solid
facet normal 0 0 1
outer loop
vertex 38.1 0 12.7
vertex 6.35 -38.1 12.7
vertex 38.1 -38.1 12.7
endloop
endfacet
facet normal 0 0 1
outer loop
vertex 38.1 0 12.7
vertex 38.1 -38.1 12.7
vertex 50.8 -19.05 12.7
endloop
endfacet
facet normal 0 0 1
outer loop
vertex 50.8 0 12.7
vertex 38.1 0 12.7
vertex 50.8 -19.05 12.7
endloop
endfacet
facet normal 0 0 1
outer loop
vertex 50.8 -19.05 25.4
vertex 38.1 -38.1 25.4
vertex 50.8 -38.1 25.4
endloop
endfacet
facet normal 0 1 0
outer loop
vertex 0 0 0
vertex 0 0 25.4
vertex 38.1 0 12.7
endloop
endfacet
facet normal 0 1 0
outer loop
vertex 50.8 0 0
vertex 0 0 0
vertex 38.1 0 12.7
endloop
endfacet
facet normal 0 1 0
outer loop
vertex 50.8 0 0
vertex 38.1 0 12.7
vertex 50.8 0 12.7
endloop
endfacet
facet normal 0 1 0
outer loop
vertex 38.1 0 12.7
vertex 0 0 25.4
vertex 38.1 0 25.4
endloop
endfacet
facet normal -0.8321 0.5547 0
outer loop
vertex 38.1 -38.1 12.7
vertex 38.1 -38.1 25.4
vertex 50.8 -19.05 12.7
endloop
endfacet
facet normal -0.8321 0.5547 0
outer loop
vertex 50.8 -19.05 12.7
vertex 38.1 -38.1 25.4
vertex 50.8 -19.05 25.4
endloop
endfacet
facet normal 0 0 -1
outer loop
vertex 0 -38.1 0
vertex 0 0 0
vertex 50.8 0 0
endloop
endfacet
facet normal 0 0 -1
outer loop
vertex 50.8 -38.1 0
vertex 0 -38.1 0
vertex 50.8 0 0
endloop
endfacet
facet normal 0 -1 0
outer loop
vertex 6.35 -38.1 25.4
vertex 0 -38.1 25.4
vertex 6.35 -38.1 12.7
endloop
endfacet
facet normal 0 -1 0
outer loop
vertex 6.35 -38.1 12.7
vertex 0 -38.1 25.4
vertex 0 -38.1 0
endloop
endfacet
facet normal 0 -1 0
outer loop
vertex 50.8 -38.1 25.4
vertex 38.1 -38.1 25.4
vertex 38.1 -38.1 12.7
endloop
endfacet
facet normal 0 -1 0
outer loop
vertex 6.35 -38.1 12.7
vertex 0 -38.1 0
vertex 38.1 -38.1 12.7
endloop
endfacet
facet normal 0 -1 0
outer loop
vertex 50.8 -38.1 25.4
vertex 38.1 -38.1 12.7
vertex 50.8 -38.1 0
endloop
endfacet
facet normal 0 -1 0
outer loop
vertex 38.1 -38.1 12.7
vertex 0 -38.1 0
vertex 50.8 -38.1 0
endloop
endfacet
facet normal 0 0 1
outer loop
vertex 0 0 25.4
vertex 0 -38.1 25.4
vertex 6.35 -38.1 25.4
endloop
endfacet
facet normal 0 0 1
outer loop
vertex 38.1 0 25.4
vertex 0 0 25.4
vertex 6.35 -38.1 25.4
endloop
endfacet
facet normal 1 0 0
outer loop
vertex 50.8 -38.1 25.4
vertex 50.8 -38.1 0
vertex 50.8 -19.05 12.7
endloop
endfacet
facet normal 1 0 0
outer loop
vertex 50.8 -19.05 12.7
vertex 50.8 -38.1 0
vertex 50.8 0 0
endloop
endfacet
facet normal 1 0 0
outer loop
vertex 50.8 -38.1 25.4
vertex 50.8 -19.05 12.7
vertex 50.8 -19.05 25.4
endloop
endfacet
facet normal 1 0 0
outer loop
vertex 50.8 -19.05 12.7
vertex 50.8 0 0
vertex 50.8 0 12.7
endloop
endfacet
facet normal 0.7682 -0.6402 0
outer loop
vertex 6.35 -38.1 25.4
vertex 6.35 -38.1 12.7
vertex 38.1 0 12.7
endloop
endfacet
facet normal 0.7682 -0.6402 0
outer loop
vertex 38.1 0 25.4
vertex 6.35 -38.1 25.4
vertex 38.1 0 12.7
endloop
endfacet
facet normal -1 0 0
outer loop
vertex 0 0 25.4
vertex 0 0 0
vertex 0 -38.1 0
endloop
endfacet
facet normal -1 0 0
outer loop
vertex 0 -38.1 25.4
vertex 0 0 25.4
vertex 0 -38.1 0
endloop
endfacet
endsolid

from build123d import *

# Parameters (mm, degrees)
F0_W     = 50.8
F0_H     = 25.4
F1_DEPTH = 38.1
F3_DEPTH = 12.7
F5_DEPTH = 12.7


with BuildPart() as f1:
    # F0 (on Front) → F1 (new body)
    with BuildSketch(Plane.XZ):
        with Locations((25.4, 12.7)):
            Rectangle(F0_W, F0_H)
    extrude(amount=F1_DEPTH)

    # F2 (on face) → F3 (cut)
    with BuildSketch(Plane.XY.offset(25.4)):
        Polygon((0, -38.1), (38.1, -38.1), (50.8, -19.05), (50.8, 0), (38.1, 0), (0, -31.75), align=None)
    extrude(amount=-F3_DEPTH, mode=Mode.SUBTRACT)

    # F4 (on face) → F5 (join)
    with BuildSketch(Plane.XY.offset(12.7)):
        Polygon((0, -38.1), (6.35, -38.1), (38.1, 0), (0, 0), align=None)
    extrude(amount=F5_DEPTH)


solid = f1.part
